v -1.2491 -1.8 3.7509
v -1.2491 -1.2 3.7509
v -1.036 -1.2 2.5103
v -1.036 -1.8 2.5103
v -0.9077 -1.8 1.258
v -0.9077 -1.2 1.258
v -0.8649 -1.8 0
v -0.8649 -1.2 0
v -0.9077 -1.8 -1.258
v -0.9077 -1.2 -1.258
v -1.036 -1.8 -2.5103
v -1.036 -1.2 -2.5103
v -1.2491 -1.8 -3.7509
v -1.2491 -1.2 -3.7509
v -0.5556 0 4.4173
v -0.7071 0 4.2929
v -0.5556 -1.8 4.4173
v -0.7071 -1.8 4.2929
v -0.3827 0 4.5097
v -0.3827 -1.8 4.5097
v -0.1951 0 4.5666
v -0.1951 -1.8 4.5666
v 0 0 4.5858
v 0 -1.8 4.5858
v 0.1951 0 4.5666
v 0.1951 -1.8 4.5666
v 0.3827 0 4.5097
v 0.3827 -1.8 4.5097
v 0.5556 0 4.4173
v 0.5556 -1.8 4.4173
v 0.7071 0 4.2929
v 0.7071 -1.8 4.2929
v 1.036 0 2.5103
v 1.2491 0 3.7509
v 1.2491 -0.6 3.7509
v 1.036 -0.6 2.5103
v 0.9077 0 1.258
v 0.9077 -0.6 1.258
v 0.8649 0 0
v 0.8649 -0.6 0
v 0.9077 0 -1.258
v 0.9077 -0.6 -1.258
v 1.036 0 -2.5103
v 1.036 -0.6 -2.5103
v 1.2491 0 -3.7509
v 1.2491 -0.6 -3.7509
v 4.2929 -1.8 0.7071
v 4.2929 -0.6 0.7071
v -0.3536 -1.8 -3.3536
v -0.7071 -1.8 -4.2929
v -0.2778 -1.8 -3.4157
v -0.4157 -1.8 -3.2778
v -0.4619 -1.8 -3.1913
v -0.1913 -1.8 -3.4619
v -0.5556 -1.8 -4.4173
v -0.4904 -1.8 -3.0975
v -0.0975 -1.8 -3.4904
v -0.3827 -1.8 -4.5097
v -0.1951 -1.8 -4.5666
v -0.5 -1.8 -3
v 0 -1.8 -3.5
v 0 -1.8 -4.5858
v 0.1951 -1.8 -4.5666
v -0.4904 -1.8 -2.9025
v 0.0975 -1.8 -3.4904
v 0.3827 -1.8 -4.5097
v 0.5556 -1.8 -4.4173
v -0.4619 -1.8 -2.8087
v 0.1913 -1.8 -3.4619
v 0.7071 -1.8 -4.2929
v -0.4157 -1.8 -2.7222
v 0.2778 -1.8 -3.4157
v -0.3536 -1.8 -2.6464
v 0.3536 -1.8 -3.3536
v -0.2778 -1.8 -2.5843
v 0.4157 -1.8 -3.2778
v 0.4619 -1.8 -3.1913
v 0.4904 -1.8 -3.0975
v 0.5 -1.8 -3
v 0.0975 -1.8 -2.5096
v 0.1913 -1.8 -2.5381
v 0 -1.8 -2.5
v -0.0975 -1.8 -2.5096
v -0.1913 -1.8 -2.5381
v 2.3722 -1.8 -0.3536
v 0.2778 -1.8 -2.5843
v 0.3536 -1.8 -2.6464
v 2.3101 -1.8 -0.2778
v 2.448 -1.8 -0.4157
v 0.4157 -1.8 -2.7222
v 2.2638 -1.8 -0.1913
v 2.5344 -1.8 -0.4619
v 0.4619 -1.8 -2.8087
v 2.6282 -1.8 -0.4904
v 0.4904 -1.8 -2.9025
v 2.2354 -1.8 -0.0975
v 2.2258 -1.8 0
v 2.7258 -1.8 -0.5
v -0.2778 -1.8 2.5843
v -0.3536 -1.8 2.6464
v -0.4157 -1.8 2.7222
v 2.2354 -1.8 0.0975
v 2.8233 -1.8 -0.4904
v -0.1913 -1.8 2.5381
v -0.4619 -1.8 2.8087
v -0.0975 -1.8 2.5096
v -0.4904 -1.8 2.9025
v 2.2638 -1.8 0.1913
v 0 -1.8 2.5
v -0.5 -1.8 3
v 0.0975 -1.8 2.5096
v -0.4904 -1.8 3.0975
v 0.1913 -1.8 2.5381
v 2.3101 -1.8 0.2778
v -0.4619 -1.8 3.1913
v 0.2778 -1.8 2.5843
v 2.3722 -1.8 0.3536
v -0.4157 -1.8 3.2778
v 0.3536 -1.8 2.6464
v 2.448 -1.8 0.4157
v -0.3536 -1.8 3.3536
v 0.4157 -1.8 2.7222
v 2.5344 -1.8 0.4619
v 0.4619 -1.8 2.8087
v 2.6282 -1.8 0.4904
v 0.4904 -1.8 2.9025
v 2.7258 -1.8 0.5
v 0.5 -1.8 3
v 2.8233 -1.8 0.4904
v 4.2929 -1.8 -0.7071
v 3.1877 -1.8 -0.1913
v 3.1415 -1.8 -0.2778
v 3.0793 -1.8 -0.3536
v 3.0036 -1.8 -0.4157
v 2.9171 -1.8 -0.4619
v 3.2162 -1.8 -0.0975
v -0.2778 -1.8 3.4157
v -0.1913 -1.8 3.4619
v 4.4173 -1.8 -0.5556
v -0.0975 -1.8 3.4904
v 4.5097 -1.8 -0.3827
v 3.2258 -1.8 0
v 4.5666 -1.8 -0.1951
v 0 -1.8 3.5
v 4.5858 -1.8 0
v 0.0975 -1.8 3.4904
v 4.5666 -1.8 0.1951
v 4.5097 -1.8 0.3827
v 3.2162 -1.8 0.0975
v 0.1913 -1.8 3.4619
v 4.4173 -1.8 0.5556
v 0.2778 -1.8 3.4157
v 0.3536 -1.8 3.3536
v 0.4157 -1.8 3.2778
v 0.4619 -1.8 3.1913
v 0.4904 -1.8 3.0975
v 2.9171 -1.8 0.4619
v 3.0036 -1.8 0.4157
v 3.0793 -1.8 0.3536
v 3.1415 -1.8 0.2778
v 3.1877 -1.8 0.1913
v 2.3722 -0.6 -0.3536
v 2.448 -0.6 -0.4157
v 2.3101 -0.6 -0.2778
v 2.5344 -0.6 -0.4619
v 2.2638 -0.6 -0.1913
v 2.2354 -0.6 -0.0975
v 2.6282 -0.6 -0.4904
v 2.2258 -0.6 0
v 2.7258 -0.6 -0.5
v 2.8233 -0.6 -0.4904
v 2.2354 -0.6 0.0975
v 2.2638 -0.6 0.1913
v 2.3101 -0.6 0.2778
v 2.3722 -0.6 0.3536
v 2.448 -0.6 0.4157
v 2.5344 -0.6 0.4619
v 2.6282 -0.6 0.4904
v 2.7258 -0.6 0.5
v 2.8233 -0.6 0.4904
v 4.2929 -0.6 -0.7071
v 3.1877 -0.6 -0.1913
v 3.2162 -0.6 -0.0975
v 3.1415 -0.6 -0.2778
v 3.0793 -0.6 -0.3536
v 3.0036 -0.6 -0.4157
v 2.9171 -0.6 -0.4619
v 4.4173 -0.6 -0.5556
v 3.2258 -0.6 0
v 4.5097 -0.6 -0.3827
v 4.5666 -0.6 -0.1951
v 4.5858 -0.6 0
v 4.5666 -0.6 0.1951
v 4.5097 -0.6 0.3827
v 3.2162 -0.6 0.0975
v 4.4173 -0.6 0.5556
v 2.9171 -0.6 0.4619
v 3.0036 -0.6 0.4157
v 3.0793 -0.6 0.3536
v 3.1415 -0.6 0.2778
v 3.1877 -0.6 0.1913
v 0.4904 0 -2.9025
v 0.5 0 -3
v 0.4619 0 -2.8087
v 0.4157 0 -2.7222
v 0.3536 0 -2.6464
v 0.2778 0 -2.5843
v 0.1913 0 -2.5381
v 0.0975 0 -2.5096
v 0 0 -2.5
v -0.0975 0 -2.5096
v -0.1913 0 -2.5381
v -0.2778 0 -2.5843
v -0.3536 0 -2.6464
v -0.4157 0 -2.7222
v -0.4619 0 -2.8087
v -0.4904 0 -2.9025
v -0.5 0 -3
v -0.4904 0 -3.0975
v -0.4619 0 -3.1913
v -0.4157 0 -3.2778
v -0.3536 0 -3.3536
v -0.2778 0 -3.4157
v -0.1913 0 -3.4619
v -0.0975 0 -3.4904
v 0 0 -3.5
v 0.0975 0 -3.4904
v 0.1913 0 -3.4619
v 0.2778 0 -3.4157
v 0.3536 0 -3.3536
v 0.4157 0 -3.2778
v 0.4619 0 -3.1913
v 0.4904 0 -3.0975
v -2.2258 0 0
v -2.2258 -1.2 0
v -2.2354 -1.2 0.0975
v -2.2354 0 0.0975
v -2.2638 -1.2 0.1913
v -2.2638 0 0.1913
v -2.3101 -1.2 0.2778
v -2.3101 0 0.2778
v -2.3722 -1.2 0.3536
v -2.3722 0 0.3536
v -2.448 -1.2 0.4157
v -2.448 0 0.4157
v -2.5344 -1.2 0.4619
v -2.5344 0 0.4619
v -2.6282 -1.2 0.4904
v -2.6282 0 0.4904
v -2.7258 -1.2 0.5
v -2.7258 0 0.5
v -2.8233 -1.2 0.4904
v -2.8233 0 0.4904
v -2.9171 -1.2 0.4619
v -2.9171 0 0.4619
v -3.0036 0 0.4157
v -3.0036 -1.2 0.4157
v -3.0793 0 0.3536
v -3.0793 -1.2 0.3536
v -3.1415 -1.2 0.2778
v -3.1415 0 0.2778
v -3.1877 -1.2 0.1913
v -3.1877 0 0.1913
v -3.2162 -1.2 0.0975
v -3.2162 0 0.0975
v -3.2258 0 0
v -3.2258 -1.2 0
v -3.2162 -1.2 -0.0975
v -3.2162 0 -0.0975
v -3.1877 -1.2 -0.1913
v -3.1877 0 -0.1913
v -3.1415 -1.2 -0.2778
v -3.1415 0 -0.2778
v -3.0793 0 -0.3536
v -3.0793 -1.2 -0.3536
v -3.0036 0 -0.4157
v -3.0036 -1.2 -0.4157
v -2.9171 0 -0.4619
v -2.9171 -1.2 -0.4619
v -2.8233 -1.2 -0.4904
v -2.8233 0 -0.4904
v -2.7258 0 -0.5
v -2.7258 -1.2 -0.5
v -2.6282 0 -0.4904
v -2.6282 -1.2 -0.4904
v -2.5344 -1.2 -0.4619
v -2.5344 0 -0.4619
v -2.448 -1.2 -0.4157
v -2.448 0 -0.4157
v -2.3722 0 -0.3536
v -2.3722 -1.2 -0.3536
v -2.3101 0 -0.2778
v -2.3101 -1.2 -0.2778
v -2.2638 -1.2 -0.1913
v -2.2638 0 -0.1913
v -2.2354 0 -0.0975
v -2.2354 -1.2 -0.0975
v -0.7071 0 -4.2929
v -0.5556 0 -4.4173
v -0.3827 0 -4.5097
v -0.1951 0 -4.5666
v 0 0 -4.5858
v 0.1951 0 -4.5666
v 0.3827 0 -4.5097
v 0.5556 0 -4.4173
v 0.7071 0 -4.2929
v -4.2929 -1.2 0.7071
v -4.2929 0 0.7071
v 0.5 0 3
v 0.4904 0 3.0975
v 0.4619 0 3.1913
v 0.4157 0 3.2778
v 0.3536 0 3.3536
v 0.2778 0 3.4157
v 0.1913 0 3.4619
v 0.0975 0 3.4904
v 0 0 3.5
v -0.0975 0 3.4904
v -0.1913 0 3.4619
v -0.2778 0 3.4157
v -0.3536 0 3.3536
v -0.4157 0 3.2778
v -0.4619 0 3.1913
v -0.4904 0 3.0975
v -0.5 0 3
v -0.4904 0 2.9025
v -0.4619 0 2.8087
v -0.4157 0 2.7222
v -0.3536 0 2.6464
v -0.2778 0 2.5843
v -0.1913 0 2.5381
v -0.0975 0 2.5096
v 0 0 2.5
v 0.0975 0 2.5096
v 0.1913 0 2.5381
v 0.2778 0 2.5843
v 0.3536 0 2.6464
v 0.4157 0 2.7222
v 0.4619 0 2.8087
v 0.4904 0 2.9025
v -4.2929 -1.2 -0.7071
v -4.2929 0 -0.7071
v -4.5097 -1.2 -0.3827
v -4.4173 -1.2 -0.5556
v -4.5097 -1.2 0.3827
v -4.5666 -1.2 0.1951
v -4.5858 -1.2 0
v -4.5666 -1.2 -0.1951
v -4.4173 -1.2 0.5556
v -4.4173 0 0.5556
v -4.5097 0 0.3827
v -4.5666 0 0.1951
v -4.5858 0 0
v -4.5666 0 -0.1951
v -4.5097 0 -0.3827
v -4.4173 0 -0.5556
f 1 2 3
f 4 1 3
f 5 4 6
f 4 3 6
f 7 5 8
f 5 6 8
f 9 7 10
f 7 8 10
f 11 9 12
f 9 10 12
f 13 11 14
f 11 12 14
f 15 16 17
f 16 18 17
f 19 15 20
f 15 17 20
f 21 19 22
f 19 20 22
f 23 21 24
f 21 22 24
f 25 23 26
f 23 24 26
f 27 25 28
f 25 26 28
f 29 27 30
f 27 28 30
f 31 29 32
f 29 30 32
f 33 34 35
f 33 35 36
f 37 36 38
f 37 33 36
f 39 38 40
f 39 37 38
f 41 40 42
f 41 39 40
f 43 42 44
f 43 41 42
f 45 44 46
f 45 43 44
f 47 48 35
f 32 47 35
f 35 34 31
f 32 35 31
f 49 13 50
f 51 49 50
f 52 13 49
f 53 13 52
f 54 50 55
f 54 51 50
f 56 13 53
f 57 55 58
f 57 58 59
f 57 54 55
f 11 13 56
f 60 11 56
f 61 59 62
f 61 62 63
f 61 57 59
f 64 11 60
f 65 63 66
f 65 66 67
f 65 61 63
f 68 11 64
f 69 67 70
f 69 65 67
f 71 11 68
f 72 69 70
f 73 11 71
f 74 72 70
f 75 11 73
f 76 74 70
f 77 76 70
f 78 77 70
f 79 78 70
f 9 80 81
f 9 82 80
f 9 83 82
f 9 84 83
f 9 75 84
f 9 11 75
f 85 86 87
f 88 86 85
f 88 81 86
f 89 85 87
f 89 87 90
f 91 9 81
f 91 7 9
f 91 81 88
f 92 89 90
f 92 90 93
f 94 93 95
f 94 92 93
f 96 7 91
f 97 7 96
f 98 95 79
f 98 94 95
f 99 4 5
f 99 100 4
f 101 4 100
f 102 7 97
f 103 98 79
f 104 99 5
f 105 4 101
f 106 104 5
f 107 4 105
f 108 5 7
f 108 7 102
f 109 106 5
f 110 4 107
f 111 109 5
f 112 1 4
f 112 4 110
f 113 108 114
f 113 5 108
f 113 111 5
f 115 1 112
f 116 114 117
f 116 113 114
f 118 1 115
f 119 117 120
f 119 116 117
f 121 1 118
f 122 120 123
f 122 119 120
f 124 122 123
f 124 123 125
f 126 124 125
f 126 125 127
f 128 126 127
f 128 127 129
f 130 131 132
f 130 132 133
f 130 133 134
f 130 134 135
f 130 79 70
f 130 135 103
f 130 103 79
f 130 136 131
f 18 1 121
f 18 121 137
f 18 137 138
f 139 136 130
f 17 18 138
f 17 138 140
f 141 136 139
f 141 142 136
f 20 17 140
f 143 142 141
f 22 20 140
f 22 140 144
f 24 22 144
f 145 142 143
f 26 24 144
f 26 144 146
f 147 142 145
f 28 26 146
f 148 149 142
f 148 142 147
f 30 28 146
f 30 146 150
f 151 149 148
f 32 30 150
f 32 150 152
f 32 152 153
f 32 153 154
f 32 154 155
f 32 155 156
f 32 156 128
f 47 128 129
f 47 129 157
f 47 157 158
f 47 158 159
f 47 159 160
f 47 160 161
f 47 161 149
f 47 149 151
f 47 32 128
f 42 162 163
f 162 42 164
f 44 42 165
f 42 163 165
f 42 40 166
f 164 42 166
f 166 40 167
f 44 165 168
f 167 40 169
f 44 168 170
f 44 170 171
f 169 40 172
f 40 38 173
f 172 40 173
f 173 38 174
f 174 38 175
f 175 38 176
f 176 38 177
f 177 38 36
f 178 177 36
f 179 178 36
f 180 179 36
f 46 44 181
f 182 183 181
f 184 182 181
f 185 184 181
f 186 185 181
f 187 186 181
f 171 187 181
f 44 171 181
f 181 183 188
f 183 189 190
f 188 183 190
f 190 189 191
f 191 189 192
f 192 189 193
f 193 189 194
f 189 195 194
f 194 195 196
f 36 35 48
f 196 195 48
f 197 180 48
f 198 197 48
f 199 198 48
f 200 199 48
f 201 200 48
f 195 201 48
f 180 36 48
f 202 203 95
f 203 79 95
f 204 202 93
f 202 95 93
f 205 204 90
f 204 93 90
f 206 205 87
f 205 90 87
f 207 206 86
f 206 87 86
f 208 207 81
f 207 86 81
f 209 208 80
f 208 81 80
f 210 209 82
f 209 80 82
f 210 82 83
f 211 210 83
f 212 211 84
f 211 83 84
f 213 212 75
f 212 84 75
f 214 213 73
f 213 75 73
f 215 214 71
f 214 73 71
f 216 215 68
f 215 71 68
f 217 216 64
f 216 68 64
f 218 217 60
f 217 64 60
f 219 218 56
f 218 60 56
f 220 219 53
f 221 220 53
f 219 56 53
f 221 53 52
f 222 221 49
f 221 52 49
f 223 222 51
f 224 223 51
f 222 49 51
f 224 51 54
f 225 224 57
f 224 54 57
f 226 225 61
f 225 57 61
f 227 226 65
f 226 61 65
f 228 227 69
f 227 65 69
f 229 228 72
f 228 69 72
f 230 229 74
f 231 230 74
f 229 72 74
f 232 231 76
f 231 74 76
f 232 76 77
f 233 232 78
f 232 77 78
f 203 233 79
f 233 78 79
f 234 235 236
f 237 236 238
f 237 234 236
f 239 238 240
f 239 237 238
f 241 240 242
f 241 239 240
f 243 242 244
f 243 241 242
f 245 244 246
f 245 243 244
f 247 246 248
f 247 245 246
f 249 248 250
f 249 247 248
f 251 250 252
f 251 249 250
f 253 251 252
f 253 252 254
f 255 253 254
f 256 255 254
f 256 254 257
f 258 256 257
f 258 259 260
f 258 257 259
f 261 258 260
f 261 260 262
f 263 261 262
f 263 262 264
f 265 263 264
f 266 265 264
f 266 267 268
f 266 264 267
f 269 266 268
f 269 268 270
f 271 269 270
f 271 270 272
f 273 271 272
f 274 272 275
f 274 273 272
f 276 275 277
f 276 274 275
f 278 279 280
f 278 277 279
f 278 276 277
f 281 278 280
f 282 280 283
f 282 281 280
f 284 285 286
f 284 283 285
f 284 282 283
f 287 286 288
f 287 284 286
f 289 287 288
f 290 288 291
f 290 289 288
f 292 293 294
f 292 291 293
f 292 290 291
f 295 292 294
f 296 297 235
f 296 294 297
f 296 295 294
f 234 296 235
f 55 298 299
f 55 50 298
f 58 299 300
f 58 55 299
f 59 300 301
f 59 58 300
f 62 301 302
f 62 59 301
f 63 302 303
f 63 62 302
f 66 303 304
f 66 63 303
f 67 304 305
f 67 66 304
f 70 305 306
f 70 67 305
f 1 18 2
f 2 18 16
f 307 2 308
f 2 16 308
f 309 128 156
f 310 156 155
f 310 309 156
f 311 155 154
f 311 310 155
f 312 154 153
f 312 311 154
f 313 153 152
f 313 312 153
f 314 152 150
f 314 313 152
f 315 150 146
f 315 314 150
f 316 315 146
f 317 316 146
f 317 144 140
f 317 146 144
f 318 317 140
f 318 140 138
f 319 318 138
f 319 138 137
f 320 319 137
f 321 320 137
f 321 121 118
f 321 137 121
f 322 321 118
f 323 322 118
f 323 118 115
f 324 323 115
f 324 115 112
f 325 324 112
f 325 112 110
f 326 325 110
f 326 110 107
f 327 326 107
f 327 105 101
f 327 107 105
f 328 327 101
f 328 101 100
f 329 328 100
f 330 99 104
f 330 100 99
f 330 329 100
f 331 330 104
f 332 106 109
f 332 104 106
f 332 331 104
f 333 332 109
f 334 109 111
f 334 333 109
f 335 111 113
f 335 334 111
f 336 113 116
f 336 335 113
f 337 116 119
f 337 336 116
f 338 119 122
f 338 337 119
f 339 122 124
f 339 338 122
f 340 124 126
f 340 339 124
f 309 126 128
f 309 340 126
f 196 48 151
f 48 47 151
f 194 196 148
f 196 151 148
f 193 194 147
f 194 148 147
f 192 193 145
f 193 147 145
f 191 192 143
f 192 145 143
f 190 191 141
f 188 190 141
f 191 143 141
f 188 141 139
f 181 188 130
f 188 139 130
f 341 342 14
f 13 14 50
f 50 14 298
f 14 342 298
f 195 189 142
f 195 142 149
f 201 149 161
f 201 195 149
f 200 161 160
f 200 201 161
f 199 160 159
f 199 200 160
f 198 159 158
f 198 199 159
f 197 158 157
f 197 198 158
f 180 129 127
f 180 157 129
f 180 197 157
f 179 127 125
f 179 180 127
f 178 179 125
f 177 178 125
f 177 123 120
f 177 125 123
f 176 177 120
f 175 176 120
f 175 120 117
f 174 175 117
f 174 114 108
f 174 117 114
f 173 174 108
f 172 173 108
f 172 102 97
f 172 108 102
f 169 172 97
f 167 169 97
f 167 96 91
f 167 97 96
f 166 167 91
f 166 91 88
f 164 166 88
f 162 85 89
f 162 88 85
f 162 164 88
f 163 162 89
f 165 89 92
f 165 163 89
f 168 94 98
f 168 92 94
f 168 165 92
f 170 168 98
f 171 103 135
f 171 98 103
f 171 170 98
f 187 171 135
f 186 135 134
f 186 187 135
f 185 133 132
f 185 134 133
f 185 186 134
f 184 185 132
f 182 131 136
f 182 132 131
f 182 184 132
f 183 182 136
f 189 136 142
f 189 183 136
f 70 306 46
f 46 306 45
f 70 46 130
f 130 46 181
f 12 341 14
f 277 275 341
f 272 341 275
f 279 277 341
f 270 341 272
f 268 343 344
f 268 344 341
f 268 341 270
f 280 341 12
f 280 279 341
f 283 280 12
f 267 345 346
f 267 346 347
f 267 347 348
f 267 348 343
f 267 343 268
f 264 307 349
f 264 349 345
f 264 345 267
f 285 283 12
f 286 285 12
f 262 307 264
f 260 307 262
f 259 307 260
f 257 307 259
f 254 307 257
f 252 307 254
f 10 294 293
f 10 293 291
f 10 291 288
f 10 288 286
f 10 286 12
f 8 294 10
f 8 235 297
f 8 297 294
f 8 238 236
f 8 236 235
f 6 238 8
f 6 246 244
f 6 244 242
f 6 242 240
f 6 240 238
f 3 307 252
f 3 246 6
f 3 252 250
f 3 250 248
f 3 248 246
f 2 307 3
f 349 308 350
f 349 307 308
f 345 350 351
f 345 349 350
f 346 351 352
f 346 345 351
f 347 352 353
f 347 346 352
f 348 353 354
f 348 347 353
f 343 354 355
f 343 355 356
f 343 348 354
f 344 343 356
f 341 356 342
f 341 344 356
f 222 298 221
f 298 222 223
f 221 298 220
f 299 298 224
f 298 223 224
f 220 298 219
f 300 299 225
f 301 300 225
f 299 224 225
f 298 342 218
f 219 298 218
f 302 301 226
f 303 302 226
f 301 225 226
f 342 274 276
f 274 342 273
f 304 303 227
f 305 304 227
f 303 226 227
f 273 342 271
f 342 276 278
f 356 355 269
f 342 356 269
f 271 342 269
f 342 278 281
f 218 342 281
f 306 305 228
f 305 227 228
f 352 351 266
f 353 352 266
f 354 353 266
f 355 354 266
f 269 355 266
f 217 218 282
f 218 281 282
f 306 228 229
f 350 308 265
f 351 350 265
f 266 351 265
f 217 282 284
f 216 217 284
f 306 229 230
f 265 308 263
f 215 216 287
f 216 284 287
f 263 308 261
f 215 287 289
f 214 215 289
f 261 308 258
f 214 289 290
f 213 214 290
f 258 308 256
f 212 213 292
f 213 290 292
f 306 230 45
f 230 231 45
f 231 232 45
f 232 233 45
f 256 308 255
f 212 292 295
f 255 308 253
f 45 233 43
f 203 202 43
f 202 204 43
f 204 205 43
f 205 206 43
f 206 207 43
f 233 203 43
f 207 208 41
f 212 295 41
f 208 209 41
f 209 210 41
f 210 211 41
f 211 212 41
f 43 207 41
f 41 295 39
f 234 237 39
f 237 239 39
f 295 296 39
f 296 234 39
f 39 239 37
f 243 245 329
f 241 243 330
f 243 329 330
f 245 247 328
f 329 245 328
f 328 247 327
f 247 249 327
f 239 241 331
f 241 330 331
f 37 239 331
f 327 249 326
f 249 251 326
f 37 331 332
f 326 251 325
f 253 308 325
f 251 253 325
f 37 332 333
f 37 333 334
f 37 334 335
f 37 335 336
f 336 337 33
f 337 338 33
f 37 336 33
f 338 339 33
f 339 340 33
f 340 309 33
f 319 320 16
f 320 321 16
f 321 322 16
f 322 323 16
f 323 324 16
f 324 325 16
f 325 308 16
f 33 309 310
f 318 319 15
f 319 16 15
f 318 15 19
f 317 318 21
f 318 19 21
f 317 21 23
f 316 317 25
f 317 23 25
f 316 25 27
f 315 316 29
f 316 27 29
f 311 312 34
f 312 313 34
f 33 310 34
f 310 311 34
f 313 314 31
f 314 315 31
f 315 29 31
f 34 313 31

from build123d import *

# Parameters (mm, degrees)
F1_DEPTH = 1.8
F2_DEPTH = 1.2
F4_DEPTH = 0.6
F5_R     = 1
F6_R     = 0.5
F7_DEPTH = 12.5


with BuildPart() as f1:
    # F0 (on Front) → F1 (new body)
    with BuildSketch(Plane.XZ):
        with BuildLine():
            Line((5, 0), (0, 5))
            Line((0, 5), (-1.249147, 3.750853))
            ThreePointArc((-1.249147, 3.750853), (-0.864917, 0), (-1.249147, -3.750853))
            Line((-1.249147, -3.750853), (0, -5))
            Line((0, -5), (5, 0))
        make_face()
    extrude(amount=F1_DEPTH)

    # F0 (on Front) → F2 (join)
    with BuildSketch(Plane.XZ):
        with BuildLine():
            ThreePointArc((-1.249147, -3.750853), (-0.864917, 0), (-1.249147, 3.750853))
            Line((-1.249147, 3.750853), (-5, 0))
            Line((-5, 0), (-1.249147, -3.750853))
        make_face()
    extrude(amount=F2_DEPTH)

    # F3 (on face) → F4 (cut)
    with BuildSketch(Plane.XZ):
        with BuildLine():
            ThreePointArc((1.249147, 3.750853), (0.864917, 0), (1.249147, -3.750853))
            Line((1.249147, -3.750853), (5, 0))
            Line((5, 0), (1.249147, 3.750853))
        make_face()
    extrude(amount=F4_DEPTH, mode=Mode.SUBTRACT)

    # F5
    f5_edges = [f1.edges().sort_by_distance(p)[0] for p in [
        (0, -0.9, 5),
        (5, -1.2, 0),
        (0, -0.9, -5),
        (-5, -0.6, 0),
    ]]
    fillet(f5_edges, radius=F5_R)

    # F6 (on Front) → F7 (cut, symmetric)
    with BuildSketch(Plane.XZ):
        with Locations((-2.725786, 0)):
            Circle(F6_R)
        with Locations((2.725786, 0)):
            Circle(F6_R)
        with Locations((0, 3)):
            Circle(F6_R)
        with Locations((0, -3)):
            Circle(F6_R)
    extrude(amount=F7_DEPTH, both=True, mode=Mode.SUBTRACT)


solid = f1.part
